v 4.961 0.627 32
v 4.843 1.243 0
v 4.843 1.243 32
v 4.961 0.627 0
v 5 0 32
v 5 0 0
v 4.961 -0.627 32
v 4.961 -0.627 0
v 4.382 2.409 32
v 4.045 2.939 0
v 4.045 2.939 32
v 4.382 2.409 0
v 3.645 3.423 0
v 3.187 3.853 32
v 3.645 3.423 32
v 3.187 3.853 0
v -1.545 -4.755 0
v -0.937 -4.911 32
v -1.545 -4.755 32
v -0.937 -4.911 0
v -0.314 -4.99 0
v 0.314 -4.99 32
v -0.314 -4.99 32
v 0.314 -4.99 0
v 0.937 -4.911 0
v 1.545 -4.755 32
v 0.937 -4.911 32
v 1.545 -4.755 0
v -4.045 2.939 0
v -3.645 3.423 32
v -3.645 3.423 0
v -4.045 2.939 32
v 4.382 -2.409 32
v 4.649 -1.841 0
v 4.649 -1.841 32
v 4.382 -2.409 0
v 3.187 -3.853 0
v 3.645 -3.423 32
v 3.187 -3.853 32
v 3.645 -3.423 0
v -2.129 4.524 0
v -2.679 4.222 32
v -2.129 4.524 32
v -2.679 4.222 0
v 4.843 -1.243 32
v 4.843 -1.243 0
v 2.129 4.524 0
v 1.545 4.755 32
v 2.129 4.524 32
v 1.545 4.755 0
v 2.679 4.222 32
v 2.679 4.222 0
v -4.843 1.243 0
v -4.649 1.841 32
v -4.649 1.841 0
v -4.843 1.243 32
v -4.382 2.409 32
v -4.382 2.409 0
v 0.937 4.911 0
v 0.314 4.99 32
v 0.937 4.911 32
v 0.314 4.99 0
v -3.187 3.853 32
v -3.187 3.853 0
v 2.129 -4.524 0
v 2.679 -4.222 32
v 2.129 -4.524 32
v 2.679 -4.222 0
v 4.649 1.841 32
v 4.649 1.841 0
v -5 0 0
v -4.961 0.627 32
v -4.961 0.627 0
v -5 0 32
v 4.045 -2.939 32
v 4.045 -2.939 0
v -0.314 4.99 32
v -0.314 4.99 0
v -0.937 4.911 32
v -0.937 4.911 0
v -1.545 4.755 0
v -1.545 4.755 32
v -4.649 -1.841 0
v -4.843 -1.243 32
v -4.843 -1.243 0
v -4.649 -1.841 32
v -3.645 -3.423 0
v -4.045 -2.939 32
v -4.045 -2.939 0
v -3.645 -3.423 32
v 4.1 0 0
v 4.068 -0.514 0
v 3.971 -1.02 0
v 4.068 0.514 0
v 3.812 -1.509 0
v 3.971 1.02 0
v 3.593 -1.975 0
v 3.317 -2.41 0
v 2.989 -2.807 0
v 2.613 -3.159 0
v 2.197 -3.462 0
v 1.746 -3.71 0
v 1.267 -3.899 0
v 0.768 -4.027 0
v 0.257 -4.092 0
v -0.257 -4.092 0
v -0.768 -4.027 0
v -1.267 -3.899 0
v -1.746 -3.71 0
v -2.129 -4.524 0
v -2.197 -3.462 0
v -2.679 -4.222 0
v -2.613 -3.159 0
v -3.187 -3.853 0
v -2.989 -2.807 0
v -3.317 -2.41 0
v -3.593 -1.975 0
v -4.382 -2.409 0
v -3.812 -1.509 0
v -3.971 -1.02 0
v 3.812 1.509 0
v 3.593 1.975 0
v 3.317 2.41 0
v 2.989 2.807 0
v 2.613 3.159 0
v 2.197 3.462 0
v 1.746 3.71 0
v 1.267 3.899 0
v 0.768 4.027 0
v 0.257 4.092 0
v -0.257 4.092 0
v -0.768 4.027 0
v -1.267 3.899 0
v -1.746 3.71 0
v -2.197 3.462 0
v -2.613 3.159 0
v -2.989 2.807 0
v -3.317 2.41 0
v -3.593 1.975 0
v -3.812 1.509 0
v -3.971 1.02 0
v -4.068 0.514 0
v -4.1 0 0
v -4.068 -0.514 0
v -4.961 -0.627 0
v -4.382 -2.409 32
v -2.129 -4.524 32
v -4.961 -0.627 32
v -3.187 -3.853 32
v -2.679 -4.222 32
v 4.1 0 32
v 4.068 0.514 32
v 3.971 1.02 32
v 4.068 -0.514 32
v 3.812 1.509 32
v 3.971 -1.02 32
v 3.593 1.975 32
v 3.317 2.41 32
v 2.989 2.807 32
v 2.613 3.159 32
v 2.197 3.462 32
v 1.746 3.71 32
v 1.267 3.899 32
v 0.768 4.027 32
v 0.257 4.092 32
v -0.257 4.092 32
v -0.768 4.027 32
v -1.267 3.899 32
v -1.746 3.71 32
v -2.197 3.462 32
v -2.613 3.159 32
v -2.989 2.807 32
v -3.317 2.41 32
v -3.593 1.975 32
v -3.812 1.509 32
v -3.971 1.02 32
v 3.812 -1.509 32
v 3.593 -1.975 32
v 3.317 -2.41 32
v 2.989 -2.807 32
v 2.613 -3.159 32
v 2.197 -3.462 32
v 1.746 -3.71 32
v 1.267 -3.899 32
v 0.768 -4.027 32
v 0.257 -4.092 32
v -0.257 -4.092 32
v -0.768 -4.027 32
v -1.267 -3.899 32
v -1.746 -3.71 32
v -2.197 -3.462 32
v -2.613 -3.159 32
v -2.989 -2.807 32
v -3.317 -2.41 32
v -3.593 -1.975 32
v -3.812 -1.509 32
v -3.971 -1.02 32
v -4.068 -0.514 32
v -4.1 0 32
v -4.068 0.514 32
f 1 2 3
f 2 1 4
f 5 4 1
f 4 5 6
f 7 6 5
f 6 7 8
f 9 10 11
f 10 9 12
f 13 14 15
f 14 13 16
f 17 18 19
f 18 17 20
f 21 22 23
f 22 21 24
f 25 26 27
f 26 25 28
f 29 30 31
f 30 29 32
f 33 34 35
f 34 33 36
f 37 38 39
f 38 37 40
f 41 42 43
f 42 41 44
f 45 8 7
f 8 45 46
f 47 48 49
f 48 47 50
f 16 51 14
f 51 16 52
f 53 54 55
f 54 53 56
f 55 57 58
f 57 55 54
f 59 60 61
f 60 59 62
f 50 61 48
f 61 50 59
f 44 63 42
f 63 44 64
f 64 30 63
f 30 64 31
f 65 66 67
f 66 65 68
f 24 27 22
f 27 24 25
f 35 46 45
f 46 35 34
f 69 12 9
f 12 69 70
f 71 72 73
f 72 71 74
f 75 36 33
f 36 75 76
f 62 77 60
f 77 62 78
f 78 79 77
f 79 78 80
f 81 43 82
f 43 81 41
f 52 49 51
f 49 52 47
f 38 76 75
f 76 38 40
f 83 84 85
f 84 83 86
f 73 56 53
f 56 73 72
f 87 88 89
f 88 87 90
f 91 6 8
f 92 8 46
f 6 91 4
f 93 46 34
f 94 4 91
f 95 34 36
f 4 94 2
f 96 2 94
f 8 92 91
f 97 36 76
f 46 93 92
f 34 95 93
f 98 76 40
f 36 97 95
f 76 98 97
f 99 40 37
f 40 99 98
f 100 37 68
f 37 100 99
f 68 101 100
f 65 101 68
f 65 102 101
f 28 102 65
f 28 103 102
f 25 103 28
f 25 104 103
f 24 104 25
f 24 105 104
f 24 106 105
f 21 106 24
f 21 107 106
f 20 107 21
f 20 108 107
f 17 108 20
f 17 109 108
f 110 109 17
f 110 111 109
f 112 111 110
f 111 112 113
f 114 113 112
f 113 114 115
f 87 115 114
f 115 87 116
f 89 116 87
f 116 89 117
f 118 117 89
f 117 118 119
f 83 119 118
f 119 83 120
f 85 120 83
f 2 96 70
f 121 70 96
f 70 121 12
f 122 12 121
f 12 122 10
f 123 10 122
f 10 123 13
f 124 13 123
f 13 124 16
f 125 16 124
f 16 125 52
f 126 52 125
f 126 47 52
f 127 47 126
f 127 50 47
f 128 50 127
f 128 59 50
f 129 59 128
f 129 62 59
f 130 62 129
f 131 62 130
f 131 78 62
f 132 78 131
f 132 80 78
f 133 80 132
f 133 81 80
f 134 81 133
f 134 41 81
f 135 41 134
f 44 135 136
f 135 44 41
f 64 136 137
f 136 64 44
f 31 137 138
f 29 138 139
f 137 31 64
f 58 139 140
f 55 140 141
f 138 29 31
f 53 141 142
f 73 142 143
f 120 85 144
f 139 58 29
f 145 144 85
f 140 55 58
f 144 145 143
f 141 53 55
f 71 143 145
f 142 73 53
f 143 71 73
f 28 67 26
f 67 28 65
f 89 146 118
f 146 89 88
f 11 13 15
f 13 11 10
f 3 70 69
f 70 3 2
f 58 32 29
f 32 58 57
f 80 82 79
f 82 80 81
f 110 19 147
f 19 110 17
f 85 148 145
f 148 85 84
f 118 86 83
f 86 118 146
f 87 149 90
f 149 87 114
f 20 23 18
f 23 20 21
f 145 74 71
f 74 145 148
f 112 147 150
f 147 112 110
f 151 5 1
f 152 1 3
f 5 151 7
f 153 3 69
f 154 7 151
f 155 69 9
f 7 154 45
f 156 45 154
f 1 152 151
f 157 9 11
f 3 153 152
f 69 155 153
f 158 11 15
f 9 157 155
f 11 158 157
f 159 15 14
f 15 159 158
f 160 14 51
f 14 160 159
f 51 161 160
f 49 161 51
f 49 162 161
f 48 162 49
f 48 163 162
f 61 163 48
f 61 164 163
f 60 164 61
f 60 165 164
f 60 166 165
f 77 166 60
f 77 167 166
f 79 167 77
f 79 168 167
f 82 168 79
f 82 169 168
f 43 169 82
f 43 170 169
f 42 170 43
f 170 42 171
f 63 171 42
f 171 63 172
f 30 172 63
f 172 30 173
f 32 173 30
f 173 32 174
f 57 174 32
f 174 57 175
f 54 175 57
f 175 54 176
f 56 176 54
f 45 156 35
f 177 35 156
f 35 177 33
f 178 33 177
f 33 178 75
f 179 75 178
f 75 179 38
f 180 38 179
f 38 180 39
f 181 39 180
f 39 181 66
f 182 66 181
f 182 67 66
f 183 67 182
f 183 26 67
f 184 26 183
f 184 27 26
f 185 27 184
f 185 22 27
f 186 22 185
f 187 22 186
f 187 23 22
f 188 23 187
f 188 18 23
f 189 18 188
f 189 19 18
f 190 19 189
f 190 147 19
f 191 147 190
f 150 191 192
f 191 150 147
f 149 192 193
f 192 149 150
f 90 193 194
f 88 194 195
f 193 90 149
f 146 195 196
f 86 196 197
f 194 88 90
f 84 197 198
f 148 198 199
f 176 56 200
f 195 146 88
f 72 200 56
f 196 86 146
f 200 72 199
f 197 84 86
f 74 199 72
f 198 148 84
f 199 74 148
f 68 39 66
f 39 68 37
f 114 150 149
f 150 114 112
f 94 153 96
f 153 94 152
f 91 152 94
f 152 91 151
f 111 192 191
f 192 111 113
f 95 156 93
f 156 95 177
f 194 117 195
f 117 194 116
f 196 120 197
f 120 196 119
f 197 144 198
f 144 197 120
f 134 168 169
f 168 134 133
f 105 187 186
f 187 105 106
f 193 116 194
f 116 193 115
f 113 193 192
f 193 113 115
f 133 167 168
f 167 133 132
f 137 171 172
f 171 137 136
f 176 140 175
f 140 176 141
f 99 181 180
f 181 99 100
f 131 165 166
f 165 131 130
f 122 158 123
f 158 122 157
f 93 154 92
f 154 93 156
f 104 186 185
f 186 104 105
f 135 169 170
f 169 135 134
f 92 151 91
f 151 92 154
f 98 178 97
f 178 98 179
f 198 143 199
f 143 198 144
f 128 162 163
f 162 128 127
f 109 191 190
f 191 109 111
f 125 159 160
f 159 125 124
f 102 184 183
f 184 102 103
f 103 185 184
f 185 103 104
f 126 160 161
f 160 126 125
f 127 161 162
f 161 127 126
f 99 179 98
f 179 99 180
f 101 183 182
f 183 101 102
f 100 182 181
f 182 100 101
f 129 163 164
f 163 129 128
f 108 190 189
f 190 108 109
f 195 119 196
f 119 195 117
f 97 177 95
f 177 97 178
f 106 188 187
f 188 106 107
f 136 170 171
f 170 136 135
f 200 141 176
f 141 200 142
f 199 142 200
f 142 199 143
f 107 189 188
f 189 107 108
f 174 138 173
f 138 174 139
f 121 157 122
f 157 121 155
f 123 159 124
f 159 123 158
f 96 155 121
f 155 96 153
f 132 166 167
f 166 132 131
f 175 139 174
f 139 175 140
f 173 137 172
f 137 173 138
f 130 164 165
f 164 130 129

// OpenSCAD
// All measurements in MM
// Inner diameter
ind =8.2;

// Outer diameter bottom
od1=10;

// Outer diameter top 
od2=10;

// Cylinder hight 
ch=32;

translate([0, 0, 0]) {
    difference() {
		translate([0, 0, 0]) cylinder(h = ch, r1 =od1/2,r2=od2/2,$fn=50);  //cylinder
		translate([0, 0, 0]) cylinder(h = ch, r= ind/2, $fn=50);               
    }
}
